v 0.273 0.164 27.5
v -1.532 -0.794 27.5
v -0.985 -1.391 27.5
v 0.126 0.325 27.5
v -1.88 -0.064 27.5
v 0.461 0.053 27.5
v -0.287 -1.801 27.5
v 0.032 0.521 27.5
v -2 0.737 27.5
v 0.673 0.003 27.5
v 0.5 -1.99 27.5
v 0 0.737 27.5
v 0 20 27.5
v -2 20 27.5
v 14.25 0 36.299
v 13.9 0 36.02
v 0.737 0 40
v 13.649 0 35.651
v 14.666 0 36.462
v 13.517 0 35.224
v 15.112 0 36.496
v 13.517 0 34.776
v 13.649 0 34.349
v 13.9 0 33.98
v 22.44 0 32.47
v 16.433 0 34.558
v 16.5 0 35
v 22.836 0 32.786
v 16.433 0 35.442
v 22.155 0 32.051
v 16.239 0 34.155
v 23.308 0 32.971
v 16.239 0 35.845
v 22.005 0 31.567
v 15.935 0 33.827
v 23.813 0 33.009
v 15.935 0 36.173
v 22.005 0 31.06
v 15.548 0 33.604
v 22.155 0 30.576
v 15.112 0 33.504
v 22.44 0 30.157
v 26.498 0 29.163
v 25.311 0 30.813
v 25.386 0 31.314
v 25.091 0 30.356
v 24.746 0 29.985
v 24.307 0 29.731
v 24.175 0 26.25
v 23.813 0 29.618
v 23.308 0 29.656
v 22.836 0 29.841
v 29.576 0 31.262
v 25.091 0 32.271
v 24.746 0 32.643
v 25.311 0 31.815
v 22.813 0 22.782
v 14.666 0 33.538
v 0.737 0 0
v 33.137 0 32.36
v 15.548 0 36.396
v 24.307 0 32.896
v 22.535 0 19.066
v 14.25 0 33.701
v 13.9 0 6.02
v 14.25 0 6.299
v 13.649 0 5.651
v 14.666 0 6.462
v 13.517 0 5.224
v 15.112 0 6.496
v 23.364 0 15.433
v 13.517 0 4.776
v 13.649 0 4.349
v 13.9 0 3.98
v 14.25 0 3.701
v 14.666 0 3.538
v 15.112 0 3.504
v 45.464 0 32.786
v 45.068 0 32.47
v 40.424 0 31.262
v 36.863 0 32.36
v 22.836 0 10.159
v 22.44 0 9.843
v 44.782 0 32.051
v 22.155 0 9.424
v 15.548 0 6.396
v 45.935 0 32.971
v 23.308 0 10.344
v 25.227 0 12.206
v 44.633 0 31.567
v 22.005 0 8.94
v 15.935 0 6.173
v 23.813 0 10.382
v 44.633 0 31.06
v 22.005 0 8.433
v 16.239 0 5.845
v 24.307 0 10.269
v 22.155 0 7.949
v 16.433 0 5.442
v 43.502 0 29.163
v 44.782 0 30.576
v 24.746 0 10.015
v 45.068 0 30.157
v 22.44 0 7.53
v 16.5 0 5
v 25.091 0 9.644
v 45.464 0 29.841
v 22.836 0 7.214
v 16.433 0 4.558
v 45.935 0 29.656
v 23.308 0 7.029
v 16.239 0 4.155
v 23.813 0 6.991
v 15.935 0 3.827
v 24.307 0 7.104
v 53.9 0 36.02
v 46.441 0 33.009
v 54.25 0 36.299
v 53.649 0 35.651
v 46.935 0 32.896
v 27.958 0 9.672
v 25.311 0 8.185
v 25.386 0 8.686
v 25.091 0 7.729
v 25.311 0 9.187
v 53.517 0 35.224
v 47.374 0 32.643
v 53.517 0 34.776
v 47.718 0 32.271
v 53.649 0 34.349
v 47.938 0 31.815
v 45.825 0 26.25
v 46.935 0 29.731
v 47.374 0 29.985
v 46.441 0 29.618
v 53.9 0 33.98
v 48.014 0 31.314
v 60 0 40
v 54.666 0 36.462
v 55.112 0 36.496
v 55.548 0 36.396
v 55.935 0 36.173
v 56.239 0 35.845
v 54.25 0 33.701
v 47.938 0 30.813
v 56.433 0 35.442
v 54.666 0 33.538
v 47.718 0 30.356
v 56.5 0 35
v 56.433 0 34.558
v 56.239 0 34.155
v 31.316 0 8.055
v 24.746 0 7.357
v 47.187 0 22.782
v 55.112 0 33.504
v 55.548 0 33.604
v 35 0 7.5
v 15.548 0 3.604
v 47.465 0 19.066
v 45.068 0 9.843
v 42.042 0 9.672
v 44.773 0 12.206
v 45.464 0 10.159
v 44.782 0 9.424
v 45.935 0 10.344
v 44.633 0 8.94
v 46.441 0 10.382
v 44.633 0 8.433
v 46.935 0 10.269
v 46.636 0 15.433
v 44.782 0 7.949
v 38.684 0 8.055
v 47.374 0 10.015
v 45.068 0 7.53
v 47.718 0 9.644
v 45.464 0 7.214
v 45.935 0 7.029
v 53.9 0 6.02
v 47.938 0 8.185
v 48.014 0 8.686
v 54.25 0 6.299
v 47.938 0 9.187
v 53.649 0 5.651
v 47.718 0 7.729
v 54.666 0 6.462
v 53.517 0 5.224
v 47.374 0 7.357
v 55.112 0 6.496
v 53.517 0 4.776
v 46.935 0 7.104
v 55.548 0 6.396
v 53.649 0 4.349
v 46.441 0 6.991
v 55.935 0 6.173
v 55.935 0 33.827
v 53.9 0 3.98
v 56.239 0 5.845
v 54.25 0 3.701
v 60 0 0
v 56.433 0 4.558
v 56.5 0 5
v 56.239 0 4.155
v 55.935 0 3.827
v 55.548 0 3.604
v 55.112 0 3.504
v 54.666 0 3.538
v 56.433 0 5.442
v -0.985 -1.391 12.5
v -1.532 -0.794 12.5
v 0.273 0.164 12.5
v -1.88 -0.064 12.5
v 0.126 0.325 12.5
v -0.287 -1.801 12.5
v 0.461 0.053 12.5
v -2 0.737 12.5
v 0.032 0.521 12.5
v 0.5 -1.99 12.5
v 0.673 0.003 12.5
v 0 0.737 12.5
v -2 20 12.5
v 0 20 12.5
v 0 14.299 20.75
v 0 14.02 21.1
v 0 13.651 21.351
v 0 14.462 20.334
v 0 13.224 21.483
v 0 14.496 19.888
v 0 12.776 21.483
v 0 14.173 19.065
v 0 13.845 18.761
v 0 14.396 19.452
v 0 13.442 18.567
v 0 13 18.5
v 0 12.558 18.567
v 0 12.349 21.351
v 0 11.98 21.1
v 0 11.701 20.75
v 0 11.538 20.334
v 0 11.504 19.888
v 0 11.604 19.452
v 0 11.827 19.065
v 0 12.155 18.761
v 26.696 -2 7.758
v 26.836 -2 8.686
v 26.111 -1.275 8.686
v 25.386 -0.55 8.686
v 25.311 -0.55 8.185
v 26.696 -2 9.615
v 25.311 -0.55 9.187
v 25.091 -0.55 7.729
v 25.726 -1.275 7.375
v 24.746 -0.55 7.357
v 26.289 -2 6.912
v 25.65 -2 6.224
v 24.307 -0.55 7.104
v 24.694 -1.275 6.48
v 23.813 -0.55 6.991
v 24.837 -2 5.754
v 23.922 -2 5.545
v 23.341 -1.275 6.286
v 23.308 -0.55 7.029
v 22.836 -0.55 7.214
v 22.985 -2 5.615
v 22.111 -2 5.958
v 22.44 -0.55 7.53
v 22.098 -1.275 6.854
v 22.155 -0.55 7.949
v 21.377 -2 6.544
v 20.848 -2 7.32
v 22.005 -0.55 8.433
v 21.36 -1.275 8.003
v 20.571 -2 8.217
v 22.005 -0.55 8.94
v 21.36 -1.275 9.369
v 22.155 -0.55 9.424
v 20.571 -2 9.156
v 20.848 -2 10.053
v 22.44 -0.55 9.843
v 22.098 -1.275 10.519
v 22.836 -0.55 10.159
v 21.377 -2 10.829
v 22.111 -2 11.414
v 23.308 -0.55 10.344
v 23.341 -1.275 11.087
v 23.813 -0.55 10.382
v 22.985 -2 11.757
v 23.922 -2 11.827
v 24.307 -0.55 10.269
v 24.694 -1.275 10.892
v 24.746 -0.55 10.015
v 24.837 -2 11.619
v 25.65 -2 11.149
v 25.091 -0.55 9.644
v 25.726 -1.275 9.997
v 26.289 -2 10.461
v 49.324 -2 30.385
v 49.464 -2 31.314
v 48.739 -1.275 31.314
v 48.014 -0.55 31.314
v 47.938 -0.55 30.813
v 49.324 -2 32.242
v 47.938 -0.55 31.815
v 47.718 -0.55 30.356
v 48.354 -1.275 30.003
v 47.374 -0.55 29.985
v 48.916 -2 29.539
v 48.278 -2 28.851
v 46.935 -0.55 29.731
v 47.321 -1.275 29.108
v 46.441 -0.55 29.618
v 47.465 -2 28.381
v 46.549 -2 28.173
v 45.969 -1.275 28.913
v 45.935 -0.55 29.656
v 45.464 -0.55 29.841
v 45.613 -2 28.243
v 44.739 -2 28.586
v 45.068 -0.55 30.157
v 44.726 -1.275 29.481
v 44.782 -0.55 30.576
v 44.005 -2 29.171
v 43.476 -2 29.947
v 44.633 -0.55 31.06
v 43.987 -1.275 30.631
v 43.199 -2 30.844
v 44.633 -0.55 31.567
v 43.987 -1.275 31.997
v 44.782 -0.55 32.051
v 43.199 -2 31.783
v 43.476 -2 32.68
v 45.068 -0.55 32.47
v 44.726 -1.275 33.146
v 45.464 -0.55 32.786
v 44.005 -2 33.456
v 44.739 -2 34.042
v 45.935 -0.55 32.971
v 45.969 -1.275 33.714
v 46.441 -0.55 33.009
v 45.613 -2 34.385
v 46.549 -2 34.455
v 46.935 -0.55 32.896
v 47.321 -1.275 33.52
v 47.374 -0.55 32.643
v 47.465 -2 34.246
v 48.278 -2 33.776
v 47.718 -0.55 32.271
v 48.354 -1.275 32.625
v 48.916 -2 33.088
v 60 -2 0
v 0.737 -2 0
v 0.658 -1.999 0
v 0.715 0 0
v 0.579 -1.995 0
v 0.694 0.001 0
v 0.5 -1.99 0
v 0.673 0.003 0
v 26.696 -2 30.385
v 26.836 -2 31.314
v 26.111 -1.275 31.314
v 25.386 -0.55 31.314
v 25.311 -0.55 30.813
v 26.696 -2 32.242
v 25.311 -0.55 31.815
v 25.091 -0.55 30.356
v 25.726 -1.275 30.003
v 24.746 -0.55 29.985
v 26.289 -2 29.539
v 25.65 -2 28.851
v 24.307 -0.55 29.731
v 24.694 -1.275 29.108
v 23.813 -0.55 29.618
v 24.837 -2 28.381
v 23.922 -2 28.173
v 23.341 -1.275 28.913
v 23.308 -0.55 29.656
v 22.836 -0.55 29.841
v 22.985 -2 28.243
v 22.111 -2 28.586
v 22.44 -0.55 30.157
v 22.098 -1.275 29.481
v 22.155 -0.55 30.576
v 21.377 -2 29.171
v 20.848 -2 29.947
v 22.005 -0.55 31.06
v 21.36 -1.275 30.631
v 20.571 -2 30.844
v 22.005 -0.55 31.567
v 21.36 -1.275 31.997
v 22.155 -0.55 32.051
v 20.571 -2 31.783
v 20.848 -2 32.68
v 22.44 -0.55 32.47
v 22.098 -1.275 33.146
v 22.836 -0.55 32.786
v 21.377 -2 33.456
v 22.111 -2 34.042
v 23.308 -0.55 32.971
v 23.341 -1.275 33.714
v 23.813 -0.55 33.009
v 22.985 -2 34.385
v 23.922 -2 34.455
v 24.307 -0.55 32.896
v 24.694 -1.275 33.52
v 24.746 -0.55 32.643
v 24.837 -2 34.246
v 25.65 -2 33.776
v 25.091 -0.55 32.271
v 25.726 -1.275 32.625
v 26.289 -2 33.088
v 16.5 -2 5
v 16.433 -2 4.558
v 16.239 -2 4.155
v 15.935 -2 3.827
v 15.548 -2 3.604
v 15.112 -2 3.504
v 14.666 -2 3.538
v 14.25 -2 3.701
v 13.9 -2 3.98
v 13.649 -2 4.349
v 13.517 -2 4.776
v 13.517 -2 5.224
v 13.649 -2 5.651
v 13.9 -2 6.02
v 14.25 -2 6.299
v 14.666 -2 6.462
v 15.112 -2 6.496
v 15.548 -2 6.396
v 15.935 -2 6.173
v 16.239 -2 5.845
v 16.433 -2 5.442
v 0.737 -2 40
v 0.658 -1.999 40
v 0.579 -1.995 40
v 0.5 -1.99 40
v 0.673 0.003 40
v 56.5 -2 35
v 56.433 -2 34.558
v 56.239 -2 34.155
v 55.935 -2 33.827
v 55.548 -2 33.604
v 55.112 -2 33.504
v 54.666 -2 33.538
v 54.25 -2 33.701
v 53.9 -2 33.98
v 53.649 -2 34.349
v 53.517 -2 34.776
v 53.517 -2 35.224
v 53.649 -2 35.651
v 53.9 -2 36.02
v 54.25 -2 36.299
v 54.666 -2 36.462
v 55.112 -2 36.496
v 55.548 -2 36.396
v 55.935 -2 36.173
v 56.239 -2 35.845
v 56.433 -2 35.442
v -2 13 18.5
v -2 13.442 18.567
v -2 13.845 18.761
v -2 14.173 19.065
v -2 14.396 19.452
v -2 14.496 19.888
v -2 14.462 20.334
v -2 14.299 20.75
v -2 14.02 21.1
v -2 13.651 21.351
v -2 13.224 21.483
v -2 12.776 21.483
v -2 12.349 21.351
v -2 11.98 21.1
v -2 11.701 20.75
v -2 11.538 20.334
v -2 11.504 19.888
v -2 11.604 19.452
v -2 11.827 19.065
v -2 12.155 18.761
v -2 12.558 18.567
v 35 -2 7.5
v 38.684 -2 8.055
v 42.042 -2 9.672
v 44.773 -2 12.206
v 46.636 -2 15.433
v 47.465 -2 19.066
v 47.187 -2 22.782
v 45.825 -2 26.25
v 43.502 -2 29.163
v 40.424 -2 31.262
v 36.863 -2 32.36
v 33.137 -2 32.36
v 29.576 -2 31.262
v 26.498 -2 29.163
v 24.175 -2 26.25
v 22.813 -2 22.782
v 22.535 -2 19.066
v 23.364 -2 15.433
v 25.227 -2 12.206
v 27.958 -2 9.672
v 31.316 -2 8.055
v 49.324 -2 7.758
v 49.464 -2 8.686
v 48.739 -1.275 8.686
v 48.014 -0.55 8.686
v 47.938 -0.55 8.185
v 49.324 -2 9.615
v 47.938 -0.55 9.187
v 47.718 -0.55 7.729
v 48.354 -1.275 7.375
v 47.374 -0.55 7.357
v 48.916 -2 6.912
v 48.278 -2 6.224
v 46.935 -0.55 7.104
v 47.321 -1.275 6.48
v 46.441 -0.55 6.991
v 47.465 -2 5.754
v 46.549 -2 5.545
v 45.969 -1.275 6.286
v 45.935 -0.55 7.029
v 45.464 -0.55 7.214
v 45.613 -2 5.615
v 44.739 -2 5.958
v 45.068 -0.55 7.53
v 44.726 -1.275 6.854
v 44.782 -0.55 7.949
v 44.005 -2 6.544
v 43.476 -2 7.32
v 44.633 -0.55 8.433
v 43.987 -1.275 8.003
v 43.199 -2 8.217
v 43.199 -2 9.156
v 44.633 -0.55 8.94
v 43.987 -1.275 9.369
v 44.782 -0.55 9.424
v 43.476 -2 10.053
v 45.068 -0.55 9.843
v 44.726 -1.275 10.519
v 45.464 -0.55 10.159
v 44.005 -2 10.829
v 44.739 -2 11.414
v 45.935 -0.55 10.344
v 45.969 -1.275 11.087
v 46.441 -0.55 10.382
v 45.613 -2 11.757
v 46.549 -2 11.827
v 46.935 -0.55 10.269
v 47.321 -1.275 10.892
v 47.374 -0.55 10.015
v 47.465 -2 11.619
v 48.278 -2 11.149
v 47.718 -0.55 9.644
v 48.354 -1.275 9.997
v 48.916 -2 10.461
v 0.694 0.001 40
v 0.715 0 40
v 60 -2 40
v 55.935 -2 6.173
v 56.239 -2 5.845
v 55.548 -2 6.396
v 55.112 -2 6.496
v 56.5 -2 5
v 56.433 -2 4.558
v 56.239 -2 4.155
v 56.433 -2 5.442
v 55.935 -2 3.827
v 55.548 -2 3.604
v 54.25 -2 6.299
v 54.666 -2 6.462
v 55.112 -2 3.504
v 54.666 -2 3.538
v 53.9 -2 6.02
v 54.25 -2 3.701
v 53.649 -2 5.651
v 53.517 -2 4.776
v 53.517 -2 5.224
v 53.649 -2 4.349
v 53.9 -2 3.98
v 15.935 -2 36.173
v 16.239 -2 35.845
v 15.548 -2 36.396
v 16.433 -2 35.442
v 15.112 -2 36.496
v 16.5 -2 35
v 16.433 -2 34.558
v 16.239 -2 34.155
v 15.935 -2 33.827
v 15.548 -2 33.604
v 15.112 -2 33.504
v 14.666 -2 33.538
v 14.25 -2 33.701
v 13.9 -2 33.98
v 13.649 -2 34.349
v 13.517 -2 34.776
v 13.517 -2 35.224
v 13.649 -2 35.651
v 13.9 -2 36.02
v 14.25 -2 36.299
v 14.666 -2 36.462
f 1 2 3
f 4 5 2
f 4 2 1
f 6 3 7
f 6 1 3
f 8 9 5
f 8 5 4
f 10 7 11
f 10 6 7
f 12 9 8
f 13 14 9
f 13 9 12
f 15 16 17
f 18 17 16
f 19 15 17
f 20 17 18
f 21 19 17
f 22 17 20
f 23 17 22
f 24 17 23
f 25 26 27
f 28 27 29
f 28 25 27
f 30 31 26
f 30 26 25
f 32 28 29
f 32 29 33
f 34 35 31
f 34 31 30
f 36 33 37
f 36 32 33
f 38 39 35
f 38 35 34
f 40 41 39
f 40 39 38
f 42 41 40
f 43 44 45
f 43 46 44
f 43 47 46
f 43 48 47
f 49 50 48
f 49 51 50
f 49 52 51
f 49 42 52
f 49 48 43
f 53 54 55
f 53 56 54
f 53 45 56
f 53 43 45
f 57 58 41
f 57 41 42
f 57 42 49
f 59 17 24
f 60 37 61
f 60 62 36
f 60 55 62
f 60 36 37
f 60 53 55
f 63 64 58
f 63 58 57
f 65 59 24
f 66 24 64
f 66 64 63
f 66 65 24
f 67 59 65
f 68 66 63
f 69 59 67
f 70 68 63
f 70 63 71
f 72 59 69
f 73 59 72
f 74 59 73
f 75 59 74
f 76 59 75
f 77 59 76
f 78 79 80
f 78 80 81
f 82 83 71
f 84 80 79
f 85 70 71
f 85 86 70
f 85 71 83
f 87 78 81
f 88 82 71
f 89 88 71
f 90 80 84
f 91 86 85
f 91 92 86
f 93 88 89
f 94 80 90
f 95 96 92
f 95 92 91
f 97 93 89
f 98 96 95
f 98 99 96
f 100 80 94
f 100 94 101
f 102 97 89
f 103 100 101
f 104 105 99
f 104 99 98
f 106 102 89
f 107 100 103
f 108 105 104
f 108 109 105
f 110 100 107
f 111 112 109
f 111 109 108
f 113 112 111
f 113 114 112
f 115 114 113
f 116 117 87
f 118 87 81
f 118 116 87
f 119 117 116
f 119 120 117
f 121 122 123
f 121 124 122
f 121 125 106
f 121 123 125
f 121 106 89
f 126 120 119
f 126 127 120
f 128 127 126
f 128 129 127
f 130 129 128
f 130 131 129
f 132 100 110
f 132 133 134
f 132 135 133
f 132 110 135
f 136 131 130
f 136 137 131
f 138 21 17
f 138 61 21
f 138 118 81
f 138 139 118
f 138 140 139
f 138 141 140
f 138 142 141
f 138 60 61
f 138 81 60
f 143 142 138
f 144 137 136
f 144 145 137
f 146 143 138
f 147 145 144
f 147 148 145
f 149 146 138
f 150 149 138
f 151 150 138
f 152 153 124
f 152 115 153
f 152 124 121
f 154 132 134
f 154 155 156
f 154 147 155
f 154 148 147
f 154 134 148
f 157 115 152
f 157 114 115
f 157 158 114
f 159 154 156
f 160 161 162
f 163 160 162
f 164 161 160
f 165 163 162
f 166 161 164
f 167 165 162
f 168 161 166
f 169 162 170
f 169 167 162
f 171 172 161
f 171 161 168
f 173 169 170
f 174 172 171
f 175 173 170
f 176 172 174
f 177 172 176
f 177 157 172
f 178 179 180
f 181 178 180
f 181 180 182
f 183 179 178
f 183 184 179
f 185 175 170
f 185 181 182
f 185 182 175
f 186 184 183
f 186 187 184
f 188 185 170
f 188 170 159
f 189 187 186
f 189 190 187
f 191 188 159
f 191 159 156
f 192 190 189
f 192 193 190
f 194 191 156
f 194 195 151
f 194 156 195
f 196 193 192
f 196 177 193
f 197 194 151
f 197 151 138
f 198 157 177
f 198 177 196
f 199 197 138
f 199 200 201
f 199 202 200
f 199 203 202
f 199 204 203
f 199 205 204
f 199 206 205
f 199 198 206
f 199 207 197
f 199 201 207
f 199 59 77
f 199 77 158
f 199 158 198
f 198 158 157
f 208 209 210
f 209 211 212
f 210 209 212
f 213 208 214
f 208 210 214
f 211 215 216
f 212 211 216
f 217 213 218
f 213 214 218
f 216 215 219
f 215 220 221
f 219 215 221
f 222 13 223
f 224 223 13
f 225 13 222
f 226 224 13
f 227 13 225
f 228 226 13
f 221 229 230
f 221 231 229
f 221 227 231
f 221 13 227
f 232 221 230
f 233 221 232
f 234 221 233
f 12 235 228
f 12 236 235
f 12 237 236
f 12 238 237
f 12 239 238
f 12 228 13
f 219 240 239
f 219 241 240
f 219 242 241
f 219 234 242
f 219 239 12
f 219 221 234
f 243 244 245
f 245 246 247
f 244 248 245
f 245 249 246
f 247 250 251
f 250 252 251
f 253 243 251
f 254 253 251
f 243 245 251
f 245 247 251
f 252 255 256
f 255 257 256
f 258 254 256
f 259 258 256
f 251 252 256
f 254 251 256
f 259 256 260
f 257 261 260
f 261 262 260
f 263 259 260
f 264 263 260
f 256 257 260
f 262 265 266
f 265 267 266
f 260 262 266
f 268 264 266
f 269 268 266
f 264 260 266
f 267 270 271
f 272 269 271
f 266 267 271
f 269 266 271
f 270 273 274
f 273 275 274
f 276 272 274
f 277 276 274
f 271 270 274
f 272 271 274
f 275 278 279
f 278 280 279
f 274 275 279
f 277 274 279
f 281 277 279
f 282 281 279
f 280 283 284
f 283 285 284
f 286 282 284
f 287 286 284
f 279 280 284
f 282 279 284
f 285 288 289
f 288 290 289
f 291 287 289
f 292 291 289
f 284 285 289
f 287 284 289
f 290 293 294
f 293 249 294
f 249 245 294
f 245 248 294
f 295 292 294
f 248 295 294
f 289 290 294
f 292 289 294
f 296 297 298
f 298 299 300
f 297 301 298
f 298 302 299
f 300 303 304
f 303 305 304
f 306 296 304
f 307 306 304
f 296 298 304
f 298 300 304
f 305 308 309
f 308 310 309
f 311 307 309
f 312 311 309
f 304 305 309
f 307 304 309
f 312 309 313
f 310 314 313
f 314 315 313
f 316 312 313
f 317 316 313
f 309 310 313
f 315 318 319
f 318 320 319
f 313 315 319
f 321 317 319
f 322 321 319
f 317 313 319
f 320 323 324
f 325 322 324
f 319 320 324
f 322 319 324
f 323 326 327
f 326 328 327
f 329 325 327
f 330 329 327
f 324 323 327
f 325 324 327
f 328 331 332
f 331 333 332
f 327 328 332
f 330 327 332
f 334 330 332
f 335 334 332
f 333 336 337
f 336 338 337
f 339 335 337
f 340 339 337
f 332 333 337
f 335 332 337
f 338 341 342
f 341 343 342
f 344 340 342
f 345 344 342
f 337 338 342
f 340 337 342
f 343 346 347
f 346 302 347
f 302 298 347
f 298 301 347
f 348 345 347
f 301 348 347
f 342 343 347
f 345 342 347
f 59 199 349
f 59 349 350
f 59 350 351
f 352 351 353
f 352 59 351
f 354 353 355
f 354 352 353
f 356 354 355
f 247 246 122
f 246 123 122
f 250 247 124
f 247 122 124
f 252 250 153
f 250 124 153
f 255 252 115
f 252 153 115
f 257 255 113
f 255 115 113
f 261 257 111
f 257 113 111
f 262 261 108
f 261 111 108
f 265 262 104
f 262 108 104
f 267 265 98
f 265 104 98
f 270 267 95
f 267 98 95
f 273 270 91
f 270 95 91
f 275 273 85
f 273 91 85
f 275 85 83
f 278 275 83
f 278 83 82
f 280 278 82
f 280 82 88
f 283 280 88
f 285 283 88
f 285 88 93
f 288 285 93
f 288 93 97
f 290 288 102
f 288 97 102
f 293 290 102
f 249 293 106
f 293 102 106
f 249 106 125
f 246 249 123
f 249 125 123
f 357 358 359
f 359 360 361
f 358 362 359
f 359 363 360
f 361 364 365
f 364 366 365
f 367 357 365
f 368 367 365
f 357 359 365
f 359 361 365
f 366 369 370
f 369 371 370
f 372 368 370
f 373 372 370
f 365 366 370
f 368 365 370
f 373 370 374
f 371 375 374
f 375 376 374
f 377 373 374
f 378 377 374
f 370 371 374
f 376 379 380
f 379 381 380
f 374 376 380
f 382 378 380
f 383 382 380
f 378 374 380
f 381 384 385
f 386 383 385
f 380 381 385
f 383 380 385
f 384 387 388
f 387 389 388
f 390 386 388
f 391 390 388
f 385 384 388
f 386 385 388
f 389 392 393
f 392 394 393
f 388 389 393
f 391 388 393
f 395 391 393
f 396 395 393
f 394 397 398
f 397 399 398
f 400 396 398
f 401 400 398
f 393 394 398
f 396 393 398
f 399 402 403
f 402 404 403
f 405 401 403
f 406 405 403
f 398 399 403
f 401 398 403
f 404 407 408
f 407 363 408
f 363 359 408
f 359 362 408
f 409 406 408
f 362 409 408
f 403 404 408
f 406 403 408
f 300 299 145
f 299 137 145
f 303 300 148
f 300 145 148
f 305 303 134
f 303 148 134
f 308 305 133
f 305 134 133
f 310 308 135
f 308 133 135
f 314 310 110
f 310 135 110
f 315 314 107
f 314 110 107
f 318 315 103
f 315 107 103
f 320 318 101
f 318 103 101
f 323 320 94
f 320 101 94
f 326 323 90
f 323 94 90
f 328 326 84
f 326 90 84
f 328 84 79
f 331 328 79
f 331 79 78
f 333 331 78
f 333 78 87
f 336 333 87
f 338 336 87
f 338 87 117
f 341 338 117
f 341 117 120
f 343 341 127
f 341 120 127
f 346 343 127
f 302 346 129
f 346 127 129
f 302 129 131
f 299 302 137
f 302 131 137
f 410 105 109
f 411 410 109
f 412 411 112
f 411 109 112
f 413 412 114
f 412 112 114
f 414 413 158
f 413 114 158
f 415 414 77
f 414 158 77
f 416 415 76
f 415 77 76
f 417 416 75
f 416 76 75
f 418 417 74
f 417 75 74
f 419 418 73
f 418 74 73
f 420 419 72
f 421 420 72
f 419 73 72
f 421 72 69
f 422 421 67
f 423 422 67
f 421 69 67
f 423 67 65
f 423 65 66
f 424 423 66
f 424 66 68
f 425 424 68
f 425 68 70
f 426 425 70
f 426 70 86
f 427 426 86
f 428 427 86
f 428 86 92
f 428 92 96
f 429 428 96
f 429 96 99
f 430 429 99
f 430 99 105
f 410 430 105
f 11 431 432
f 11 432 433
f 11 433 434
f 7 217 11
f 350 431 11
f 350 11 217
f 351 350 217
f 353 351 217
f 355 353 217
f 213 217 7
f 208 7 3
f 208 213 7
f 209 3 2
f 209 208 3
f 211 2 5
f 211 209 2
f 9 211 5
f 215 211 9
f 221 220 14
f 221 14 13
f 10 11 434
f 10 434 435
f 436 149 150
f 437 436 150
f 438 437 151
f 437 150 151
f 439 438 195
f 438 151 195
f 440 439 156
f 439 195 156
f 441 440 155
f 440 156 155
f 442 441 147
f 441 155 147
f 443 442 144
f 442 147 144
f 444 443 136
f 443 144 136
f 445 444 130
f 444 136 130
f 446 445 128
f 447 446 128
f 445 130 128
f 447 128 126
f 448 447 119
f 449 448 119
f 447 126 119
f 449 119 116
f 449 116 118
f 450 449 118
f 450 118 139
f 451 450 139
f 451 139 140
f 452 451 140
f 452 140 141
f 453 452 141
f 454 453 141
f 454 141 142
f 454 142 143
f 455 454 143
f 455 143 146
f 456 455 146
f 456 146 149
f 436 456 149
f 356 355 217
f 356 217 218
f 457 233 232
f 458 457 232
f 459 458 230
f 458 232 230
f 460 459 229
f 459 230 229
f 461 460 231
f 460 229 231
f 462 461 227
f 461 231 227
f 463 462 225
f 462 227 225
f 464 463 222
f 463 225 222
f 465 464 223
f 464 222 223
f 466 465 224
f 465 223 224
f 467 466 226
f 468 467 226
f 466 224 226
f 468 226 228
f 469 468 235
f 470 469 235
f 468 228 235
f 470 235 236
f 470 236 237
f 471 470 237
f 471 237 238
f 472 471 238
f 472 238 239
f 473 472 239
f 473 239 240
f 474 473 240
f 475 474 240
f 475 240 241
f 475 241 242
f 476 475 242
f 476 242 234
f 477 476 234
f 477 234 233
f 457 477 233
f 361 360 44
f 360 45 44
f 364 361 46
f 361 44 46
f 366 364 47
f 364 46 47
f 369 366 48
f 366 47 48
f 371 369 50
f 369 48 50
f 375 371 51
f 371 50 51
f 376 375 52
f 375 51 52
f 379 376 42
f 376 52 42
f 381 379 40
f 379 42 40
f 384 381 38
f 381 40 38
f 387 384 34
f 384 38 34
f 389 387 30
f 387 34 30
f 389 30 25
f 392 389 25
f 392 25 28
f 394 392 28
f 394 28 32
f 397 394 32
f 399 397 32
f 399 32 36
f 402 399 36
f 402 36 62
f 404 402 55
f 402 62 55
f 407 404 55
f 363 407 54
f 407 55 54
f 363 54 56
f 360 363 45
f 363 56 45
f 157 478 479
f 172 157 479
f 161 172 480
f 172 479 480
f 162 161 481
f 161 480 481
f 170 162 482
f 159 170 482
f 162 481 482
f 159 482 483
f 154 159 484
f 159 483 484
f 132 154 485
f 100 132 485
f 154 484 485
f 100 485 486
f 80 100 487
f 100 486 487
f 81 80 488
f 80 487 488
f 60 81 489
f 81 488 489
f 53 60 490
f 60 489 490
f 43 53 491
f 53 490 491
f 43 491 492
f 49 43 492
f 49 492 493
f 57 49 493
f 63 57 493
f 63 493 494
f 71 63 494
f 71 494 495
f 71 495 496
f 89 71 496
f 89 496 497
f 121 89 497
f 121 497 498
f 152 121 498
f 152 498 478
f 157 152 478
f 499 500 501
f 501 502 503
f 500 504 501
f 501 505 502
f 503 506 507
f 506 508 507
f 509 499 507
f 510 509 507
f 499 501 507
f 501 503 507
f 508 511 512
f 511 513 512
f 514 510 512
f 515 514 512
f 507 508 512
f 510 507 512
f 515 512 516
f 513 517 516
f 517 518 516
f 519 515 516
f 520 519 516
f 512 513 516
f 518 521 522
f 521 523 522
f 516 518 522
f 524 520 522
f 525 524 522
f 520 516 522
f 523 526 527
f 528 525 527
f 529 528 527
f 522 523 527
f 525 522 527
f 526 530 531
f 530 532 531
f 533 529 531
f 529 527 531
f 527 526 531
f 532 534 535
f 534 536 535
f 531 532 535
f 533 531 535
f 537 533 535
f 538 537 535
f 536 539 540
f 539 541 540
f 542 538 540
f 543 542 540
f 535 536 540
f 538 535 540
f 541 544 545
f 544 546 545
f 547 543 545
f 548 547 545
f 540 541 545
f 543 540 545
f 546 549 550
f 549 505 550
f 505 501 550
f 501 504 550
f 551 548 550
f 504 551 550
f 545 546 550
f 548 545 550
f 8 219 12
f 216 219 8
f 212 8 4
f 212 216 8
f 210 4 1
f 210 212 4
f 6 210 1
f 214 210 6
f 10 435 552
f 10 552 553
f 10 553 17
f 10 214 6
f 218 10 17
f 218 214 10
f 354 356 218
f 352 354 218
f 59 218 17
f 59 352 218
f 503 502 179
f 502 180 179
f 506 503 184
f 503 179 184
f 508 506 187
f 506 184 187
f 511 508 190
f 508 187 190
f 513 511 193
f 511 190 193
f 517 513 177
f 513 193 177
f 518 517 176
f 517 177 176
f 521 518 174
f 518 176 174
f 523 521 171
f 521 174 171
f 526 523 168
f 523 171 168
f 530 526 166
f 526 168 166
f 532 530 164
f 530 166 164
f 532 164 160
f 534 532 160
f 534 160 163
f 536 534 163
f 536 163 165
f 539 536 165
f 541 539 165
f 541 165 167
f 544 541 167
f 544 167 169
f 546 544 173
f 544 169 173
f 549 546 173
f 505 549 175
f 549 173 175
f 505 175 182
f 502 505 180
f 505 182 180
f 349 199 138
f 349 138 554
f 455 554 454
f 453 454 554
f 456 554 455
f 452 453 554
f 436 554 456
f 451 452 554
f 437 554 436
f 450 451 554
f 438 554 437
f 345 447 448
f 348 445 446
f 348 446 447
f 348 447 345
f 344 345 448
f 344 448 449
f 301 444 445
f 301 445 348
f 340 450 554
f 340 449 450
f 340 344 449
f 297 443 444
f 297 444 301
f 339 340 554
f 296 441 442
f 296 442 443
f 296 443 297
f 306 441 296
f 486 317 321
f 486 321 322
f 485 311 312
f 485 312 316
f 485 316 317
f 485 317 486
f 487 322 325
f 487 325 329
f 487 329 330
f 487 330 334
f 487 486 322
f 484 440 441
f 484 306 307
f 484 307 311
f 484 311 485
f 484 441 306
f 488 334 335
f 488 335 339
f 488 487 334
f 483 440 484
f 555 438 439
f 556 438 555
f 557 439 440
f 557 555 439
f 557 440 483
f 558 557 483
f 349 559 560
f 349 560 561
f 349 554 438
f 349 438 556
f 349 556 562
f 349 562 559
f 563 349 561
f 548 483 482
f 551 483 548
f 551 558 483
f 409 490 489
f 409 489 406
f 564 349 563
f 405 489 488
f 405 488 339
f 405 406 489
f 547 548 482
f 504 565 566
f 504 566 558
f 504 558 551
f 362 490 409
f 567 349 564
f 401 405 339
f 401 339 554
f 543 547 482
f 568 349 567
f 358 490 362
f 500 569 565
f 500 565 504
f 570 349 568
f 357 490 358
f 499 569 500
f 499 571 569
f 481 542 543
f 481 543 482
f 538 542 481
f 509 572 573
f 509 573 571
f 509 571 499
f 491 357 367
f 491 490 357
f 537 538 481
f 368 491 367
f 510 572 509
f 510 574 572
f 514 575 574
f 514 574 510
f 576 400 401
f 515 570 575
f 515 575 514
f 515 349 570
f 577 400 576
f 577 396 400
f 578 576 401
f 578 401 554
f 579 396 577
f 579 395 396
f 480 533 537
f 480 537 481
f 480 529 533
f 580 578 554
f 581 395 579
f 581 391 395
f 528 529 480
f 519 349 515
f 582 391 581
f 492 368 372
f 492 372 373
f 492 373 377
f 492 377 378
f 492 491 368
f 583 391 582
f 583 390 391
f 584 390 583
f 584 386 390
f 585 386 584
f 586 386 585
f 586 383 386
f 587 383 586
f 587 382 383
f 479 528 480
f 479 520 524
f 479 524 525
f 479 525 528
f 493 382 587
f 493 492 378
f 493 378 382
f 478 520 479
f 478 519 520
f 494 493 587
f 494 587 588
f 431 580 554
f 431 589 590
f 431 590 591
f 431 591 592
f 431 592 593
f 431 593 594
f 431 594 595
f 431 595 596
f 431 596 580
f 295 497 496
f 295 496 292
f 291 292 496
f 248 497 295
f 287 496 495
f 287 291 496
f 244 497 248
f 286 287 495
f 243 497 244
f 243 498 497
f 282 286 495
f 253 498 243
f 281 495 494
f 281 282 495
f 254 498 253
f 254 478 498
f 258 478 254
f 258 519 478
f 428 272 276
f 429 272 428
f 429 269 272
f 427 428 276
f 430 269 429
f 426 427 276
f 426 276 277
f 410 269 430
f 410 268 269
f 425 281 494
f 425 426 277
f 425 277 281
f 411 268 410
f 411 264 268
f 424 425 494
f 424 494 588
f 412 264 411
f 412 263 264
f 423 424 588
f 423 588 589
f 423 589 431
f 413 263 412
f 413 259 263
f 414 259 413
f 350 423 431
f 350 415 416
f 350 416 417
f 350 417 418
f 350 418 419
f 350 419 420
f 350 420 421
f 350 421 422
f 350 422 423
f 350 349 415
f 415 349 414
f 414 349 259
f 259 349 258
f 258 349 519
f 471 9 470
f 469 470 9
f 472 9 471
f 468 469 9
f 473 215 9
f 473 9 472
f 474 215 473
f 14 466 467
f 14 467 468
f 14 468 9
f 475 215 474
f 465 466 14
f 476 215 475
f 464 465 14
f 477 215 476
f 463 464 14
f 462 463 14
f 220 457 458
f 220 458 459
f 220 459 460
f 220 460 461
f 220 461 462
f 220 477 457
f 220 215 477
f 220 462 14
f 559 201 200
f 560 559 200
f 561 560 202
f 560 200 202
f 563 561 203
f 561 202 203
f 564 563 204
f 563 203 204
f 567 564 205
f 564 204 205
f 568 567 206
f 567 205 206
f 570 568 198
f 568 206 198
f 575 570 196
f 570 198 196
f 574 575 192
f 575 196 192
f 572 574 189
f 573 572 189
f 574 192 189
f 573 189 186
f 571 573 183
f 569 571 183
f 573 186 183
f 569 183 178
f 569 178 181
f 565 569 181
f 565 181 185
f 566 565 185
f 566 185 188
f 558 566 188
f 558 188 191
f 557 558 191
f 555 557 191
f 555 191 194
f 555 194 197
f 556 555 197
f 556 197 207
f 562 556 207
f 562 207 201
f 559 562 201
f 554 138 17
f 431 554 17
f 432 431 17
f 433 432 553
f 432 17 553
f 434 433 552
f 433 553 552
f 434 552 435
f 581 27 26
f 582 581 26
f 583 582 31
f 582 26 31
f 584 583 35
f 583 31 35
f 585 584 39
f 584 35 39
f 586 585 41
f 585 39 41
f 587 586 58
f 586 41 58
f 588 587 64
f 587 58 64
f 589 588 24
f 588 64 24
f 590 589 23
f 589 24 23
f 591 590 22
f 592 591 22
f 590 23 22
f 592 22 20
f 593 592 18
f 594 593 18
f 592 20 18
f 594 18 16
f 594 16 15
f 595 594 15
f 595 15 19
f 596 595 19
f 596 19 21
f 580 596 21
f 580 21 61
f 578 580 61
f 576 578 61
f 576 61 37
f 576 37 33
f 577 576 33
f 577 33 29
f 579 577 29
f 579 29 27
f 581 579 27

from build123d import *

# Parameters (mm, degrees)
SM_BASE_FLANGE_1_DEPTH       = 40
CUT_EXTRUDE_1_REACH          = 77.392
SKETCH_6_R                   = 12.5
HOLE_WIZARD_M3_2_D           = 3
HOLE_WIZARD_M3_4_D           = 3
HOLE_WIZARD_M3_1_D           = 3.4
HOLE_WIZARD_M3_1_CSINK_D     = 6.3
HOLE_WIZARD_M3_1_CSINK_ANGLE = 90
CUT_EXTRUDE_2_DEPTH          = 12.5
CUT_EXTRUDE_START            = 27.5
CUT_EXTRUDE_2_2_DEPTH        = 12.5


# Read off the part's stored shape, not the designer's step: 除料-伸長2
# Sheet-metal steps are written as plain solids
with BuildPart() as part:
    # Sketch 1 → 基材-凸緣1 (new body)
    with BuildSketch(Plane.XY):
        with BuildLine():
            Line((0, 20), (0, 0.7366))
            ThreePointArc((0, 0.7366), (0.215745145, 0.215745145), (0.7366, 0))
            Line((0.7366, 0), (60, 0))
            Line((60, 0), (60, -2))
            Line((60, -2), (0.7366, -2))
            ThreePointArc((0.7366, -2), (-1.198468417, -1.198468417), (-2, 0.7366))
            Line((-2, 0.7366), (-2, 20))
            Line((-2, 20), (0, 20))
        make_face()
    extrude(amount=SM_BASE_FLANGE_1_DEPTH)

    # 草圖6 → 除料-伸長1 (cut, up to next)
    with BuildSketch(Plane(origin=(0, -2, 0), x_dir=(-1, 0, 0), z_dir=(0, -1, 0)), mode=Mode.PRIVATE) as cut_extrude_1_sk1:
        with Locations(Location((-35, -20, 0), (0, 0, 90))):
            Circle(SKETCH_6_R)
    cut_extrude_1_tool1 = extrude(cut_extrude_1_sk1.sketch, amount=-CUT_EXTRUDE_1_REACH, mode=Mode.PRIVATE) & part.part
    add(cut_extrude_1_tool1.solids().sort_by_distance((35, -2, 20))[0], mode=Mode.SUBTRACT)

    # M3 螺紋孔2 (through all)
    with Locations(Plane.ZY.offset(2)):
        with Locations((20, 13)):
            Hole(HOLE_WIZARD_M3_2_D / 2)

    # M3 螺紋孔4 (through all)
    with Locations(Plane(origin=(0, -2, 0), x_dir=(-1, 0, 0), z_dir=(0, -1, 0))):
        with Locations((-15, -5), (-55, -5), (-55, -35), (-15, -35)):
            Hole(HOLE_WIZARD_M3_4_D / 2)

    # M3 平錐坑頭螺釘的錐孔1 (through all)
    with Locations(Plane(origin=(0, -2, 0), x_dir=(-1, 0, 0), z_dir=(0, -1, 0))):
        with Locations((-46.313708499, -8.686291501), (-46.313708499, -31.313708499), (-23.686291501, -31.313708499), (-23.686291501, -8.686291501)):
            CounterSinkHole(HOLE_WIZARD_M3_1_D / 2, HOLE_WIZARD_M3_1_CSINK_D / 2, counter_sink_angle=HOLE_WIZARD_M3_1_CSINK_ANGLE)

    # 除料-伸長2 outline → 除料-伸長2 (cut)
    with BuildSketch(Plane.XY):
        with BuildLine():
            Line((0.5, -1.989752875), (0.672915296, 0.002758179))
            ThreePointArc((0.672915296, 0.002758179), (0.193695905, 0.238770005), (0, 0.7366))
            Line((0, 0.7366), (0, 20))
            Line((0, 20), (-2, 20))
            Line((-2, 20), (-2, 0.7366))
            ThreePointArc((-2, 0.7366), (-1.280385265, -1.112926966), (0.5, -1.989752875))
        make_face()
    extrude(amount=CUT_EXTRUDE_2_DEPTH, mode=Mode.SUBTRACT)

    # Cut-Extrude 2 2 outline → Cut-Extrude 2 2 (cut)
    with BuildSketch(Plane.XY.offset(CUT_EXTRUDE_START)):
        with BuildLine():
            Line((0.5, -1.989752875), (0.672915296, 0.002758179))
            ThreePointArc((0.672915296, 0.002758179), (0.193695905, 0.238770005), (0, 0.7366))
            Line((0, 0.7366), (0, 20))
            Line((0, 20), (-2, 20))
            Line((-2, 20), (-2, 0.7366))
            ThreePointArc((-2, 0.7366), (-1.280385265, -1.112926966), (0.5, -1.989752875))
        make_face()
    extrude(amount=CUT_EXTRUDE_2_2_DEPTH, mode=Mode.SUBTRACT)


solid = part.part
